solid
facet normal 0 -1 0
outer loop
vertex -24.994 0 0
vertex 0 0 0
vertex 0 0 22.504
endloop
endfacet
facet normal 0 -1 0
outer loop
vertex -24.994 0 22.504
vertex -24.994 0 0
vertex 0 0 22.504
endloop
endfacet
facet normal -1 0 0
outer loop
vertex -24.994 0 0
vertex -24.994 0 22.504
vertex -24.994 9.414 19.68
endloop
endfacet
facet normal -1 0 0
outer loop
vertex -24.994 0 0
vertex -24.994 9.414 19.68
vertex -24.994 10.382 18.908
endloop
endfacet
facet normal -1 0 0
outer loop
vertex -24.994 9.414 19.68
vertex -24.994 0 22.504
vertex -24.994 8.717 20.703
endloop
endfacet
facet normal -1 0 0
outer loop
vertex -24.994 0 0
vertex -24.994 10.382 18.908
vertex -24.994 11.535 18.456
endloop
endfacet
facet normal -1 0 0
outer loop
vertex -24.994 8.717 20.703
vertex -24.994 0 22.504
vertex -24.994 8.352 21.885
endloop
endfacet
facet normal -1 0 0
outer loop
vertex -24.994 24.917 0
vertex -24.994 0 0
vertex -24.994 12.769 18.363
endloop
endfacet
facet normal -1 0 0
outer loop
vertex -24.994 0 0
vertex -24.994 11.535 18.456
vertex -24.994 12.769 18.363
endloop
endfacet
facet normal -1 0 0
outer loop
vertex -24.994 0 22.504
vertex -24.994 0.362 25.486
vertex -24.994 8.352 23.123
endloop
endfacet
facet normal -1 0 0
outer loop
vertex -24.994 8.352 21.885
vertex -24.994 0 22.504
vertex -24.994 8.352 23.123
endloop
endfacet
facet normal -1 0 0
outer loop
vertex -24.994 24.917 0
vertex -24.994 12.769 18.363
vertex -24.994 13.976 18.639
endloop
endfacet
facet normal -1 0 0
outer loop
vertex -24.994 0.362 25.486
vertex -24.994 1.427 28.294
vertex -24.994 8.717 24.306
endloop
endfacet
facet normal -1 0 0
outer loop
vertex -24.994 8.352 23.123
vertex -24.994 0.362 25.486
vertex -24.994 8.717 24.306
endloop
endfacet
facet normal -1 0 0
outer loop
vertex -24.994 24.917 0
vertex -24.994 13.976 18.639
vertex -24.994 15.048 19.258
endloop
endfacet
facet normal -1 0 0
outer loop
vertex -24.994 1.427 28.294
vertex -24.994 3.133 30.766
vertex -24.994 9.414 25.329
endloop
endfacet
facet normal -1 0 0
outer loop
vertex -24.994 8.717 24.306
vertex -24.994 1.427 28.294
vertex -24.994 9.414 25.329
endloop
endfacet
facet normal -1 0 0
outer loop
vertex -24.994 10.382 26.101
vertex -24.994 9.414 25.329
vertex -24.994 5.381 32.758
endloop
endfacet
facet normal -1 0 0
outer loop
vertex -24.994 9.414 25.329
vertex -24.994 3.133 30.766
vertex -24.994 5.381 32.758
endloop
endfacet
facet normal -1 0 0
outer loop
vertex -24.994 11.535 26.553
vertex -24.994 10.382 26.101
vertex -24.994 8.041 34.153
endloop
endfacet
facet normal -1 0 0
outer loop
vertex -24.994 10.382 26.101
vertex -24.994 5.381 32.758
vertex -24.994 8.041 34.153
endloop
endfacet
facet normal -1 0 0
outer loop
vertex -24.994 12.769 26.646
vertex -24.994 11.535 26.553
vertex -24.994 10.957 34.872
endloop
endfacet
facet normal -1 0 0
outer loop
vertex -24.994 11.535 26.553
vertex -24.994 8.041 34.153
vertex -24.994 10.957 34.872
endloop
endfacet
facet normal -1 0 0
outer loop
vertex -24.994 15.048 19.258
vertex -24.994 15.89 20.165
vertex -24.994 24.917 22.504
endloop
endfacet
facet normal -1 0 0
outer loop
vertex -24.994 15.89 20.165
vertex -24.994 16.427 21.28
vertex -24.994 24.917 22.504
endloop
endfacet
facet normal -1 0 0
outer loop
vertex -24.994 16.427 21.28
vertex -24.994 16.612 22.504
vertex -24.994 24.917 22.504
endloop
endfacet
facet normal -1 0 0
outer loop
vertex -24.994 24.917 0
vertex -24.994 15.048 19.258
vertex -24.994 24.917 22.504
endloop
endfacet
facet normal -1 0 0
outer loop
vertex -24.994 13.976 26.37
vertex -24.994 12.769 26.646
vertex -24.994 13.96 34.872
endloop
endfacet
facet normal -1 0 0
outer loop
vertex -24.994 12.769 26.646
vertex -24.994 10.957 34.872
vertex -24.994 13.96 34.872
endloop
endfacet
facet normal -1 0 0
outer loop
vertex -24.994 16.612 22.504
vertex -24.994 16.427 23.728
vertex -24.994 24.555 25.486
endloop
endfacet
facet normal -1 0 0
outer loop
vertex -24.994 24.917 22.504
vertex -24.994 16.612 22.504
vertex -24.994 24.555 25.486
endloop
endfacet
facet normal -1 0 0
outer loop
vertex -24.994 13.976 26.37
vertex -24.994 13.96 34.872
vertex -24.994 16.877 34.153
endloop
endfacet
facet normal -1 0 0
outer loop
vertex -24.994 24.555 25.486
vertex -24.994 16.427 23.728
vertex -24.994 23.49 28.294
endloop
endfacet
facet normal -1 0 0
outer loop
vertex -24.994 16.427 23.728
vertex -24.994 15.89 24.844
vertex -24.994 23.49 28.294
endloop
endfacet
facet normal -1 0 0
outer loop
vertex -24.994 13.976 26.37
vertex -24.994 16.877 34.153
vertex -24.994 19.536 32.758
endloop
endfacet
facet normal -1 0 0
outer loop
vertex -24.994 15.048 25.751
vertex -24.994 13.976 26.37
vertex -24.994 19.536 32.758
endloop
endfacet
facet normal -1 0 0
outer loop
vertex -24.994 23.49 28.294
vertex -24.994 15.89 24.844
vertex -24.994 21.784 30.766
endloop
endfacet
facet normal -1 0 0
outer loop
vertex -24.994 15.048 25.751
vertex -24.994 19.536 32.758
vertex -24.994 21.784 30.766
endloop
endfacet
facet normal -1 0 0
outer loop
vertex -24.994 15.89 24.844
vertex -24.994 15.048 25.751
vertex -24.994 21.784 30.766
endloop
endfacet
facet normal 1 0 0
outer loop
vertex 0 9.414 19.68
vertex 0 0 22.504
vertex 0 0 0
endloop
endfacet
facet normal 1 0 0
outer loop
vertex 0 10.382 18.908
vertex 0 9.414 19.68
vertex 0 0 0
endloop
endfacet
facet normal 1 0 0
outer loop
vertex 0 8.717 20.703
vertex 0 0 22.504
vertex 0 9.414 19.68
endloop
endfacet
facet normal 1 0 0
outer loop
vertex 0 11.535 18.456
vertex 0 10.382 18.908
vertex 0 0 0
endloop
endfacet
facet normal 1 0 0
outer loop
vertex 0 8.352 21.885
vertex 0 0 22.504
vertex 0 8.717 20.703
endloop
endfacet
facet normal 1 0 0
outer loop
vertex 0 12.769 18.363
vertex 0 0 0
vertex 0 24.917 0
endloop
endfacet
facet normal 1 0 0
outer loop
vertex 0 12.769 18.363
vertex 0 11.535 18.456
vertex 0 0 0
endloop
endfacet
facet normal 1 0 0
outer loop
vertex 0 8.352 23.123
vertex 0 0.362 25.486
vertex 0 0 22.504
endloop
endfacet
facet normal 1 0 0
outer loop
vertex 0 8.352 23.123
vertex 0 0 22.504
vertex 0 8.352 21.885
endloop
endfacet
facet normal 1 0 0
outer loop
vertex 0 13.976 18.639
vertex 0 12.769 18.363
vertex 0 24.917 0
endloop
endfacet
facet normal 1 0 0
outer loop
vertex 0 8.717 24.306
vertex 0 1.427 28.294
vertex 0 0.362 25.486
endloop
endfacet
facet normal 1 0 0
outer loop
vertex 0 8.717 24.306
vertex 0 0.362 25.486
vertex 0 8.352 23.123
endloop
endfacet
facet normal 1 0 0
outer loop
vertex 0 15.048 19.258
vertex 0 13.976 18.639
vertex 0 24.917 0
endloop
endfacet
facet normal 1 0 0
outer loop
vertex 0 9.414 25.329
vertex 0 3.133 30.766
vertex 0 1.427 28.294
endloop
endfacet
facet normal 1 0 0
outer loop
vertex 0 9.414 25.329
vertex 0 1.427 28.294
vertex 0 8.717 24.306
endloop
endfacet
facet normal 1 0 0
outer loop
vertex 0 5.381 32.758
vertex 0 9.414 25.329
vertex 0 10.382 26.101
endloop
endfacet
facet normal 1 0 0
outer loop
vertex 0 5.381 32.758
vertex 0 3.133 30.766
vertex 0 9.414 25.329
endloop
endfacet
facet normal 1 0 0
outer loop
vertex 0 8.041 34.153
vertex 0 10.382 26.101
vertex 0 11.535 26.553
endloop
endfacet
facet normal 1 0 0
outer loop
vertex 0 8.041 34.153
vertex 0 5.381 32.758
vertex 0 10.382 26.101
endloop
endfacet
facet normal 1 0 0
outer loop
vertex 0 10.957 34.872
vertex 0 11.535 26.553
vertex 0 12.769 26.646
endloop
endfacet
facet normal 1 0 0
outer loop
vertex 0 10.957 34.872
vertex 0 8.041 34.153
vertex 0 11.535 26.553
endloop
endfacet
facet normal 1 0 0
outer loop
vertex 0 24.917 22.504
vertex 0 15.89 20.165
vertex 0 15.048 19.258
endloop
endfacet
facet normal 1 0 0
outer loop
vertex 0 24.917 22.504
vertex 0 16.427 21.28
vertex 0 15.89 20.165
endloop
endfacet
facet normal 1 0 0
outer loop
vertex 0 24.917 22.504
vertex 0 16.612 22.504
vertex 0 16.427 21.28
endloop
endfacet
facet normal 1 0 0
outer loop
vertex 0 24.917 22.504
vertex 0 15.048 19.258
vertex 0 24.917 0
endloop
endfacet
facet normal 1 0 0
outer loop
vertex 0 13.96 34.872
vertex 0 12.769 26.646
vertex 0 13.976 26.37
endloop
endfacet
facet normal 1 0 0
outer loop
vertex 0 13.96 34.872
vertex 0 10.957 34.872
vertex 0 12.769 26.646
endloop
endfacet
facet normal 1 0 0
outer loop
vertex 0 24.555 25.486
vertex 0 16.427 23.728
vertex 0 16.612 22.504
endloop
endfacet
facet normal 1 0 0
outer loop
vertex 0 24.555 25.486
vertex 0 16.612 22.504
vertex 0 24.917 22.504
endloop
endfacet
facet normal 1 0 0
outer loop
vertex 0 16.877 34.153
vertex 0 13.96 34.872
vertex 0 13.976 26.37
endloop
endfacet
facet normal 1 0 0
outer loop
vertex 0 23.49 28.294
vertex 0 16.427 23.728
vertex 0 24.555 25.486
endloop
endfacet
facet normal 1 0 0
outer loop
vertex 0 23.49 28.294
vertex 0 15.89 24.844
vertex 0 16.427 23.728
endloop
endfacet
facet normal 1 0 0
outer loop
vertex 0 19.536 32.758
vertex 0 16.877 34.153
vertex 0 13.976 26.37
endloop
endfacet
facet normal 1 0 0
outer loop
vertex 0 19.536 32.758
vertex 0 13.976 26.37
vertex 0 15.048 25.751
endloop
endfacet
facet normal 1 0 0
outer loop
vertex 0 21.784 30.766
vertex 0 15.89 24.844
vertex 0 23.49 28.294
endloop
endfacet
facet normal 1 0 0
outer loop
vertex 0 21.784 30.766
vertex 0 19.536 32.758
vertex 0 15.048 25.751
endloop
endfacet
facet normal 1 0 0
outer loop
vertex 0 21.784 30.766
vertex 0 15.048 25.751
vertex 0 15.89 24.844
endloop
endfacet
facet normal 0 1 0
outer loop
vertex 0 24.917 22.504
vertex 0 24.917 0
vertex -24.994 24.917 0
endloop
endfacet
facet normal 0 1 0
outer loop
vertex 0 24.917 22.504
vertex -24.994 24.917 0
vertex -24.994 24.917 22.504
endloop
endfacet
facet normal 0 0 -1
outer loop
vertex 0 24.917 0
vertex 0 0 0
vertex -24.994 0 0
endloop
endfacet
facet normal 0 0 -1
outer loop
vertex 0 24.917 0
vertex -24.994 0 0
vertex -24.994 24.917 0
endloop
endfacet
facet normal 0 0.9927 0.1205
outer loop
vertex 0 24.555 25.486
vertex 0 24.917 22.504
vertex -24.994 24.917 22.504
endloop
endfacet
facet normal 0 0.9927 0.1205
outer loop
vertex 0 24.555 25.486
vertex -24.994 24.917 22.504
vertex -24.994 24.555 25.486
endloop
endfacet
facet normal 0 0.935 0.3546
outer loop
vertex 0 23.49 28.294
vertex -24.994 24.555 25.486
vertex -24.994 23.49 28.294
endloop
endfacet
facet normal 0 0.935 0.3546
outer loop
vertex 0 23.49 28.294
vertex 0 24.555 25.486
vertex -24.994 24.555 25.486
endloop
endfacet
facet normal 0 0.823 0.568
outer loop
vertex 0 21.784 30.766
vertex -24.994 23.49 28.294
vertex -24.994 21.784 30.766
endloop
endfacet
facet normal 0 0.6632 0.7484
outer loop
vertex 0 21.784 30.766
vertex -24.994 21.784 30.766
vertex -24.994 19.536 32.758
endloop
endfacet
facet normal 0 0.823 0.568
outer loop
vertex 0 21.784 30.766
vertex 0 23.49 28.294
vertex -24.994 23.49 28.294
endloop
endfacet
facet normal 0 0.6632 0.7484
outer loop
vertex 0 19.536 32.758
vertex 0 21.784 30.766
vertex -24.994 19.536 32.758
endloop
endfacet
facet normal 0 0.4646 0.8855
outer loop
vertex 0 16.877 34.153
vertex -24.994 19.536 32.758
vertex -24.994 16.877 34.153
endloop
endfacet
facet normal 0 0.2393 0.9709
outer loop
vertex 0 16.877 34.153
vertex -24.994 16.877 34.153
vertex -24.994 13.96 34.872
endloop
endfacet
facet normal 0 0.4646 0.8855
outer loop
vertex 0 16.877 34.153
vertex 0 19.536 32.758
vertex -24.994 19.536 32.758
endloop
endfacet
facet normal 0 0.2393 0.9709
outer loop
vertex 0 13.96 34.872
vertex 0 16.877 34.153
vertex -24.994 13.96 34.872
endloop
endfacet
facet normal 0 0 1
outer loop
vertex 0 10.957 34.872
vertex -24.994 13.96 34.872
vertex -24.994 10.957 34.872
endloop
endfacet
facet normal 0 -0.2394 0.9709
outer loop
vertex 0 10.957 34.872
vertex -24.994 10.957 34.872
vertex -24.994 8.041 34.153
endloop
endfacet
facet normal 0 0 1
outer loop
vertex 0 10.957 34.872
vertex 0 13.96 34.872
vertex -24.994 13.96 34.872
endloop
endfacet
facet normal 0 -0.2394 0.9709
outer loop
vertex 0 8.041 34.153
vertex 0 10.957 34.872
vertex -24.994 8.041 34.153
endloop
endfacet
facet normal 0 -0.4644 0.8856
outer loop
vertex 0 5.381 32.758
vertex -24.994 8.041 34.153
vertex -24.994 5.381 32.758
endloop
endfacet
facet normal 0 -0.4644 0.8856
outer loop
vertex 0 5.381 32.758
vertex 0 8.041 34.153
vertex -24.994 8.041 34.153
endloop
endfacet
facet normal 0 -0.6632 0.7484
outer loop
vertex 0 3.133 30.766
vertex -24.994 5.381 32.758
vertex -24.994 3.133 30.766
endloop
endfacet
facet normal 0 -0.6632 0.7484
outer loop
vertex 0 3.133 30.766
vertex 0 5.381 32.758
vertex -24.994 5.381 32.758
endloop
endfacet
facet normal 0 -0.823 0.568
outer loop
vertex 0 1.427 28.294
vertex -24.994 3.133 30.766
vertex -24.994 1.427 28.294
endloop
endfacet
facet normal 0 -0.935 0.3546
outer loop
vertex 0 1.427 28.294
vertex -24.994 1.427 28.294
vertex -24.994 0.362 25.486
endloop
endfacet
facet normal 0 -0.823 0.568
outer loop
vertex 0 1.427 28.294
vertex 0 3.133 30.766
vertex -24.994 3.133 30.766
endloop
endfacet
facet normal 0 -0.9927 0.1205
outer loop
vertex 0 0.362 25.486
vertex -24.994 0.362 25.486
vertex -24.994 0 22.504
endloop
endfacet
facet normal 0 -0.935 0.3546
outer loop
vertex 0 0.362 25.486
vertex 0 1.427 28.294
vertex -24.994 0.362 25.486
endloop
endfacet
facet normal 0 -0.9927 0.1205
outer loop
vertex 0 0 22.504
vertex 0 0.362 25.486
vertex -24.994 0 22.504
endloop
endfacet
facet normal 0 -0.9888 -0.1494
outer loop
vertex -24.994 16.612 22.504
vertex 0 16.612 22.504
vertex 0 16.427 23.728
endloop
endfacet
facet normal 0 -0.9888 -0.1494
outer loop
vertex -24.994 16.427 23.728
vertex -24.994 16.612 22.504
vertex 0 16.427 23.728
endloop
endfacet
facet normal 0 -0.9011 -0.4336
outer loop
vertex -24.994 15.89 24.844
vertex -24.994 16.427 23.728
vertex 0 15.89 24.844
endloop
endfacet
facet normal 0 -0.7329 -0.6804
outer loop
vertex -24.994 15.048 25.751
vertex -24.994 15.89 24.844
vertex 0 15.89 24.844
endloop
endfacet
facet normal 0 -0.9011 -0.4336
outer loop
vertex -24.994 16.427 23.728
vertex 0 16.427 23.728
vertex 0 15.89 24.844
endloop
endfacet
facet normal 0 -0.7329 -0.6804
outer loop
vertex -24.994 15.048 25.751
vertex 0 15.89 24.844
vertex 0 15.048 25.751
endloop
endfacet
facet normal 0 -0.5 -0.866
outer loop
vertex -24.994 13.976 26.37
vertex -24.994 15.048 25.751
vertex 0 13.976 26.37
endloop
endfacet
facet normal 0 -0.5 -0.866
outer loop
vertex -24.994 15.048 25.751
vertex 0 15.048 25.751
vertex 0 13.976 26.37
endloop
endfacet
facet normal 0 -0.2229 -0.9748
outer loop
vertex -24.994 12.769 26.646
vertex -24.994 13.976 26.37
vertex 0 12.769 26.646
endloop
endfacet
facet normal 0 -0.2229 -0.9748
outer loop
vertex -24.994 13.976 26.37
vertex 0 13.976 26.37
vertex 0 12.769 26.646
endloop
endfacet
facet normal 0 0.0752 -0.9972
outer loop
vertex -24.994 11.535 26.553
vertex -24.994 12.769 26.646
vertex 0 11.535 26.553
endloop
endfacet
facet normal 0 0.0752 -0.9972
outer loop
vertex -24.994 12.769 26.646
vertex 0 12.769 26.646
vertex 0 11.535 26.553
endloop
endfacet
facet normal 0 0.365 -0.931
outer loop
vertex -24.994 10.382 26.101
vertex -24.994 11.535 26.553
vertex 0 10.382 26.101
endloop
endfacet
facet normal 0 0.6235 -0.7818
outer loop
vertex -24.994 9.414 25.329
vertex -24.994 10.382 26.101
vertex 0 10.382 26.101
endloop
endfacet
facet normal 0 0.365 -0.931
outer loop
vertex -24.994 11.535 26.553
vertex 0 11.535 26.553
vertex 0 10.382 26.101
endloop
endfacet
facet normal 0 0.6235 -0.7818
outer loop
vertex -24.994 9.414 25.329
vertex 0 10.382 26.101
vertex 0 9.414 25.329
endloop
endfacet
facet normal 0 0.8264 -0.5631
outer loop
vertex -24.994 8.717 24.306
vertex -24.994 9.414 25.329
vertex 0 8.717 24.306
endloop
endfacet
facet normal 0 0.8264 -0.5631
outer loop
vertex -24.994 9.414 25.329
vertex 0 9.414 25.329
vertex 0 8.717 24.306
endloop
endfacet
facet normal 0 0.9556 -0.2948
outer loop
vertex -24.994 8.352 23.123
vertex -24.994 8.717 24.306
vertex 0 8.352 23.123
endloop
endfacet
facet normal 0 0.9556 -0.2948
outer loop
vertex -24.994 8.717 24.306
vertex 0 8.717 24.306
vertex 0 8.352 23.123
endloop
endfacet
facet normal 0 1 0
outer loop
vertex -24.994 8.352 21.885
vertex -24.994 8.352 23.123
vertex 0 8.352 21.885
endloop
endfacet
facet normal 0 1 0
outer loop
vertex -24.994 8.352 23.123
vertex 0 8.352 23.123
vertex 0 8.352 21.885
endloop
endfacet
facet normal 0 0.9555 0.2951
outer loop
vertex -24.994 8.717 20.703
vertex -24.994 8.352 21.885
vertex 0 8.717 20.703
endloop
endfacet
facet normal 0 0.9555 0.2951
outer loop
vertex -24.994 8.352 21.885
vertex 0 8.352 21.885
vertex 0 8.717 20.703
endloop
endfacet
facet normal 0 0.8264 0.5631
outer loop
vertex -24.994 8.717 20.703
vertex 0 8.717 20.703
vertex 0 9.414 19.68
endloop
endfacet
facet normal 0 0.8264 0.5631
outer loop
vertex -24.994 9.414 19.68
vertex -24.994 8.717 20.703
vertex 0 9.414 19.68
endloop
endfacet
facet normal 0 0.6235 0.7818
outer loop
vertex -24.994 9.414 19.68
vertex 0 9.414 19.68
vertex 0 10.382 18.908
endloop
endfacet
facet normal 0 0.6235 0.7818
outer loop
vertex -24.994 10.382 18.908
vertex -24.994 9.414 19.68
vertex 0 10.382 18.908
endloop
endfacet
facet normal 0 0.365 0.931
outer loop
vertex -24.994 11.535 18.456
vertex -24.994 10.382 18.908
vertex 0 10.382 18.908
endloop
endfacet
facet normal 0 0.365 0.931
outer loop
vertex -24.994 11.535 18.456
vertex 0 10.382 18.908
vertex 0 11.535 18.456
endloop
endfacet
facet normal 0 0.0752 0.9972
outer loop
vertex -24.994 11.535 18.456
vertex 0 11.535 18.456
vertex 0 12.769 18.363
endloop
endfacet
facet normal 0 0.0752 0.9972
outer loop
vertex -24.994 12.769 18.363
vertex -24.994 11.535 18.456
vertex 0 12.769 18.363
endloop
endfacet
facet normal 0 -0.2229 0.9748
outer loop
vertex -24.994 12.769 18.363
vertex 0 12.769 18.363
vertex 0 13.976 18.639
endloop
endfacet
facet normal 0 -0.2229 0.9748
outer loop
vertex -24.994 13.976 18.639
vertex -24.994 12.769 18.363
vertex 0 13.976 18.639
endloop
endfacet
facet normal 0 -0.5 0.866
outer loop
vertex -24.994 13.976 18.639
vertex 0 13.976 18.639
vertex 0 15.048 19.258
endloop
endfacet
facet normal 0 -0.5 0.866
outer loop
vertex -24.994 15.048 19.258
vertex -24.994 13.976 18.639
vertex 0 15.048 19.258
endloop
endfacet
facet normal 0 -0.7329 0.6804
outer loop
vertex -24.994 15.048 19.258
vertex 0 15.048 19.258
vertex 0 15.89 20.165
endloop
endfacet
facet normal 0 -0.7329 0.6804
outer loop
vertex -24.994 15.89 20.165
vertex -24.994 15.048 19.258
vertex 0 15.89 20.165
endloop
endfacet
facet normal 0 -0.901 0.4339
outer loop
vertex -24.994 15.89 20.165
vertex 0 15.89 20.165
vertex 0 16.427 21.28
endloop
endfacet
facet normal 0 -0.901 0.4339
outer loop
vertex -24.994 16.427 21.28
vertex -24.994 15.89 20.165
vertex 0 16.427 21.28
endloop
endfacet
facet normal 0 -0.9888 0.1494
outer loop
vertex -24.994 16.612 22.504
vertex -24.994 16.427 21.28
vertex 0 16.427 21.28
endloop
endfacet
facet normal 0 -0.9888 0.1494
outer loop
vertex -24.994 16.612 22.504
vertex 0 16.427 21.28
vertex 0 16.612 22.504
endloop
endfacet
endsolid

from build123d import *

# Parameters (mm, degrees)
F0_W     = 24.9174
F0_H     = 22.5044
F1_DEPTH = 24.9936
F2_R     = 4.1529
F3_DEPTH = 24.9946


with BuildPart() as f1:
    # F0 (on Right) → F1 (new body)
    with BuildSketch(Plane.YZ):
        with Locations((12.4587, 11.2522)):
            Rectangle(F0_W, F0_H)
        with BuildLine():
            ThreePointArc((24.9174, 22.5044), (12.4587, 34.9631), (0, 22.5044))
            Line((0, 22.5044), (24.9174, 22.5044))
        make_face()
    extrude(amount=-F1_DEPTH)

    # F2 (on face) → F3 (cut, through all)
    with BuildSketch(Plane.YZ):
        with Locations((12.4587, 22.5044)):
            Circle(F2_R)
    extrude(amount=-F3_DEPTH, mode=Mode.SUBTRACT)


solid = f1.part
